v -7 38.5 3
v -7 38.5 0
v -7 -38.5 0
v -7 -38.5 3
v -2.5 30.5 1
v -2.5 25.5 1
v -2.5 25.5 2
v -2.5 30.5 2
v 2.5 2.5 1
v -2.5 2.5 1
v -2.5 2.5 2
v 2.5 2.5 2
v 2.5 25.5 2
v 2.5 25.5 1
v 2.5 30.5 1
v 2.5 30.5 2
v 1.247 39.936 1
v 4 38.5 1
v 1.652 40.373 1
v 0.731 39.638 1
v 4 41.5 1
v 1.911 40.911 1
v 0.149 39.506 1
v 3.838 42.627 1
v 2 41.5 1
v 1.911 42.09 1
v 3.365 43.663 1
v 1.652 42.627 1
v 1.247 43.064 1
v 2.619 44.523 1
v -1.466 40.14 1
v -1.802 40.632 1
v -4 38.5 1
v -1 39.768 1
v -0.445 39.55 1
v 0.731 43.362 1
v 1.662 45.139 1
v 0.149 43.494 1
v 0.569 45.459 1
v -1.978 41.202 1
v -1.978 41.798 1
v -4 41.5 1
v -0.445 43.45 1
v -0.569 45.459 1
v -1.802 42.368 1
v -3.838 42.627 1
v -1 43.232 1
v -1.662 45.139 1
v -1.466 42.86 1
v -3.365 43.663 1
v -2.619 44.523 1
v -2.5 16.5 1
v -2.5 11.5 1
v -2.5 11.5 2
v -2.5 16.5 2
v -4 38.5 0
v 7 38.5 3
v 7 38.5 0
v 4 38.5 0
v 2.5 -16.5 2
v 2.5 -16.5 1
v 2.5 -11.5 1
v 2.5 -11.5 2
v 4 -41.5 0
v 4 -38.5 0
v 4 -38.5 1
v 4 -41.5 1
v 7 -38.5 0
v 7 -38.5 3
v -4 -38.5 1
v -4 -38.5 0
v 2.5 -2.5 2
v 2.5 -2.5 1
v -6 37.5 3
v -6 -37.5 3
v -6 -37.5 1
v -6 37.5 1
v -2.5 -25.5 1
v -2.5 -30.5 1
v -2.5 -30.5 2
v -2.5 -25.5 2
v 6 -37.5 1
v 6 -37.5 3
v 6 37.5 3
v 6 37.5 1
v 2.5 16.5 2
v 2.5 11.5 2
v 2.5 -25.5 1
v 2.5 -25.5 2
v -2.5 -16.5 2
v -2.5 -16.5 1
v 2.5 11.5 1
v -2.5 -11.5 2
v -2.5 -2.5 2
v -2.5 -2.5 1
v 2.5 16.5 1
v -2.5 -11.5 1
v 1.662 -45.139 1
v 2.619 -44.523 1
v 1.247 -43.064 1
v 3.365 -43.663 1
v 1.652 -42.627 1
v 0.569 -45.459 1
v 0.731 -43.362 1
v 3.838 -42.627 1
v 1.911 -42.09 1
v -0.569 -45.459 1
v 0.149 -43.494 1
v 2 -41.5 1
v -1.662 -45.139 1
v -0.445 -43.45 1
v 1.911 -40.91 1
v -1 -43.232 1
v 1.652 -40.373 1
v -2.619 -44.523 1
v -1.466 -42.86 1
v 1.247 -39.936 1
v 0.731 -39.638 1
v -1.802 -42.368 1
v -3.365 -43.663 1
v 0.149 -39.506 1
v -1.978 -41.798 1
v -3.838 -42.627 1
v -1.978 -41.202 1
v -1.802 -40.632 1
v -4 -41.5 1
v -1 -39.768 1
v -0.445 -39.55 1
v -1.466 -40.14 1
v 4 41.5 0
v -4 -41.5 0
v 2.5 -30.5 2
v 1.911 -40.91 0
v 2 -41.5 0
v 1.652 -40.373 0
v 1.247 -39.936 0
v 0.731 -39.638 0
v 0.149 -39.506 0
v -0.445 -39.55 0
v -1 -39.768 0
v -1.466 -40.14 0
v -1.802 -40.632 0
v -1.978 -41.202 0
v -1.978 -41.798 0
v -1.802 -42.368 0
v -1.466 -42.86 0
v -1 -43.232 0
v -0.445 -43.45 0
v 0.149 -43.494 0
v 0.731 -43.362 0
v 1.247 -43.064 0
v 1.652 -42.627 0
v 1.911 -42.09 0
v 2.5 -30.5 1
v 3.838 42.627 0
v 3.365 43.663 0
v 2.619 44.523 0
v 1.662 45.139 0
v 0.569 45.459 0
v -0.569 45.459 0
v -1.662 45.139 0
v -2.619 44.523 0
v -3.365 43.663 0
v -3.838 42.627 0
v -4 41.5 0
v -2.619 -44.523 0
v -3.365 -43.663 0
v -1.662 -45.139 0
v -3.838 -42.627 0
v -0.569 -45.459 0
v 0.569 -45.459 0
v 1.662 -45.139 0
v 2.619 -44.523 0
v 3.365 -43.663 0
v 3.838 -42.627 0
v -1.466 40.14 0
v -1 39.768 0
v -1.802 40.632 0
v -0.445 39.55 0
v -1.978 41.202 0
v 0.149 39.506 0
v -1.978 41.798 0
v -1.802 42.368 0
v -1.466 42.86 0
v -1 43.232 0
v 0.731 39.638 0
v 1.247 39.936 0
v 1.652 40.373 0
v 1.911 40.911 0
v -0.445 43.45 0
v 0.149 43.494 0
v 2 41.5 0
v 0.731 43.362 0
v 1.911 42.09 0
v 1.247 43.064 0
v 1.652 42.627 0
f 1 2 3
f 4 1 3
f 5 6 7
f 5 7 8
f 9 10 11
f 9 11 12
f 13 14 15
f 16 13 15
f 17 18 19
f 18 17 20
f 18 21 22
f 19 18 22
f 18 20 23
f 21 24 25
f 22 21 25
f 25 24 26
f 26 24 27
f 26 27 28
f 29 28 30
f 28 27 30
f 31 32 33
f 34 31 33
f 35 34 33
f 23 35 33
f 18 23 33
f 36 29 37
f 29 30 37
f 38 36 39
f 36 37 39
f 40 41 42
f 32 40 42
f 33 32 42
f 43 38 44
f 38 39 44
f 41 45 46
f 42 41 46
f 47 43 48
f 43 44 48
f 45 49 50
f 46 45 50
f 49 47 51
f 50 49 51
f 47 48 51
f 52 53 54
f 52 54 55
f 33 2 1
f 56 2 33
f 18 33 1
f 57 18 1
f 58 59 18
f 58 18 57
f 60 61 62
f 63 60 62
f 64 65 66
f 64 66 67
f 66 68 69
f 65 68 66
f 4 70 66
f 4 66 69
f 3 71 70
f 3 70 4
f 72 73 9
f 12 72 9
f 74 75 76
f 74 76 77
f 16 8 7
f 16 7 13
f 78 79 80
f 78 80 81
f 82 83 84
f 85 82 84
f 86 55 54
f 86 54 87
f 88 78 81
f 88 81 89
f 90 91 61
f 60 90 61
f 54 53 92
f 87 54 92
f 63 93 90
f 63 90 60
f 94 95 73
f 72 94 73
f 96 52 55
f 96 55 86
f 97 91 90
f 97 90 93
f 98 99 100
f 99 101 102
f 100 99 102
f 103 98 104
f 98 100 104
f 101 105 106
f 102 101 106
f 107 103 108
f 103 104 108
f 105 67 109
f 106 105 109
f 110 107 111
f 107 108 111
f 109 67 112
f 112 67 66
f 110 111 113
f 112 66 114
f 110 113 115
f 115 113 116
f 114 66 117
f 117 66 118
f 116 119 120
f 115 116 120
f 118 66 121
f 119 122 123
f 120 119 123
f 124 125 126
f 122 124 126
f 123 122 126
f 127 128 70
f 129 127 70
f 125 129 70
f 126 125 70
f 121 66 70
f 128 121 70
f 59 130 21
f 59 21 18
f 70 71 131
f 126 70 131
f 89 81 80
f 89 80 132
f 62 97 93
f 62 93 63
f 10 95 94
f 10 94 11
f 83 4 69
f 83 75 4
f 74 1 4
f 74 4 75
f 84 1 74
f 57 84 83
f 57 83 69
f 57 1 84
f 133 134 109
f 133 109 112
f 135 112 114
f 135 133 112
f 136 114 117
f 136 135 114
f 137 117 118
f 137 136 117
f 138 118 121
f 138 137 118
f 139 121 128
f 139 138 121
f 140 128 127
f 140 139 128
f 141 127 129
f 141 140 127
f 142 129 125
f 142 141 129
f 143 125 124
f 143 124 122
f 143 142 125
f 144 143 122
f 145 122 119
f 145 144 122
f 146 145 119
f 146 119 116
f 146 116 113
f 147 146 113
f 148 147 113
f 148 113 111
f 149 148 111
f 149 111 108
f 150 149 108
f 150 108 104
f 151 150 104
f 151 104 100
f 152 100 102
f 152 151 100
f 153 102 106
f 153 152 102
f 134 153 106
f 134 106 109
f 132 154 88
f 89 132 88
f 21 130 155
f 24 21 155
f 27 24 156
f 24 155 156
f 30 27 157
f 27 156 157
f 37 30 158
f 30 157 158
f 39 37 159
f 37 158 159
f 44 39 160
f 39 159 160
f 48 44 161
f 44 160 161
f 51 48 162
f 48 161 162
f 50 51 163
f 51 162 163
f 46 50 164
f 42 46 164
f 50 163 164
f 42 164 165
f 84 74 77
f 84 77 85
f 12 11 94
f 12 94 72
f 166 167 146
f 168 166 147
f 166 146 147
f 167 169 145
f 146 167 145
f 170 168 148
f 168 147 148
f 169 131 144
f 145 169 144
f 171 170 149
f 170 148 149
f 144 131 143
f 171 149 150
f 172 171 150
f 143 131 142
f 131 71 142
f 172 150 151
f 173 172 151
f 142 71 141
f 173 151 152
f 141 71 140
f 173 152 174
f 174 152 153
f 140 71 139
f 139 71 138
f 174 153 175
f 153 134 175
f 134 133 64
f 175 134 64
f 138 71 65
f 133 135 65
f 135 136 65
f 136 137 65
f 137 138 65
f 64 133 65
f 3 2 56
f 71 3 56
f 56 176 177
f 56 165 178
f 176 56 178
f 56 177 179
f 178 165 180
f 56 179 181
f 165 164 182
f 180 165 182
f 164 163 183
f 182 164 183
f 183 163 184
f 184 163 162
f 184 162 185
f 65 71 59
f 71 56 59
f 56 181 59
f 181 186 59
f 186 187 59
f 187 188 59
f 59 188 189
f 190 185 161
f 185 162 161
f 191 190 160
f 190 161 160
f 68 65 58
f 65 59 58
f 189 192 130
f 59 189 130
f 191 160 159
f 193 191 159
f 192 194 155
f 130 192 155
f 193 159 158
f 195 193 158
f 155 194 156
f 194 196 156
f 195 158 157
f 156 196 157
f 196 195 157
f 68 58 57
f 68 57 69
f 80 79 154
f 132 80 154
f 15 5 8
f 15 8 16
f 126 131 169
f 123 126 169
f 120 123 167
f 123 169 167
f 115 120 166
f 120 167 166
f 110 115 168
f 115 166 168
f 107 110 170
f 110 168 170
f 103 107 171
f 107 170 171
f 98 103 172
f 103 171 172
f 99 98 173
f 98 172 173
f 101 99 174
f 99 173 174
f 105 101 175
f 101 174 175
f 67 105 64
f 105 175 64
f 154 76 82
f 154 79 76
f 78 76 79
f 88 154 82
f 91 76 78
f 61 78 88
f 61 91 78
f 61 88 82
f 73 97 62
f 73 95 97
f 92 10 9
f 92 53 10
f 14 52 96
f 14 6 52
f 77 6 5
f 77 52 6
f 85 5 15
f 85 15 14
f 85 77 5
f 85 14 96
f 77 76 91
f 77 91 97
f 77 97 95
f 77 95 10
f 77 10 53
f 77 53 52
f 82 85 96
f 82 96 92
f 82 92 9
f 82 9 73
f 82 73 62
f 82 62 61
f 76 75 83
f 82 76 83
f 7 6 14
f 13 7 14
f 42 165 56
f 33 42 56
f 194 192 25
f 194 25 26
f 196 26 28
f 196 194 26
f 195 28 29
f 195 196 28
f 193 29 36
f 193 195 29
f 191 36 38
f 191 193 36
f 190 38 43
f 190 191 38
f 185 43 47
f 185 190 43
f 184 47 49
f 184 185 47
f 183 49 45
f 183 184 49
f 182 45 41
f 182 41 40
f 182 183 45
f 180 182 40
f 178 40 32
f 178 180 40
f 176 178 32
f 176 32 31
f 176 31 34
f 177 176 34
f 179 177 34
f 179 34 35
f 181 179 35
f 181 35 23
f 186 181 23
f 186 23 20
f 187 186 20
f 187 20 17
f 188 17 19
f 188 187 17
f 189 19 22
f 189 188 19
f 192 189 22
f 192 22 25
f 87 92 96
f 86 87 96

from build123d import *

# Parameters (mm, degrees)
SKETCH_R     = 2
PAD_DEPTH    = 1
SKETCH001_W  = 14
SKETCH001_H  = 77
PAD001_DEPTH = 3
SKETCH002_W  = 12
SKETCH002_H  = 75
POCKET_DEPTH = 2
SKETCH003_W  = 5
SKETCH003_H  = 5
PAD002_DEPTH = 2


with BuildPart() as part:
    # Sketch → Pad (new body)
    with BuildSketch(Plane.XY):
        with BuildLine():
            Line((7, 38.5), (7, -38.5))
            Line((7, -38.5), (4, -38.5))
            Line((4, -38.5), (4, -41.5))
            ThreePointArc((-4, -41.5), (0, -45.5), (4, -41.5))
            Line((-4, -38.5), (-4, -41.5))
            Line((-7, -38.5), (-4, -38.5))
            Line((-7, 38.5), (-7, -38.5))
            Line((-7, 38.5), (-4, 38.5))
            Line((-4, 41.5), (-4, 38.5))
            ThreePointArc((4, 41.5), (0, 45.500017), (-4, 41.5))
            Line((4, 41.5), (4, 38.5))
            Line((4, 38.5), (7, 38.5))
        make_face()
        with Locations((0, -41.5)):
            Circle(SKETCH_R, mode=Mode.SUBTRACT)
        with Locations((0, 41.500017)):
            Circle(SKETCH_R, mode=Mode.SUBTRACT)
    extrude(amount=PAD_DEPTH)

    # Sketch001 → Pad001 (join)
    with BuildSketch(Plane.XY):
        Rectangle(SKETCH001_W, SKETCH001_H)
    extrude(amount=PAD001_DEPTH)

    # Sketch002 (on Face17 of Pad001) → Pocket (cut)
    with BuildSketch(Plane.XY.offset(3)):
        Rectangle(SKETCH002_W, SKETCH002_H)
    extrude(amount=-POCKET_DEPTH, mode=Mode.SUBTRACT)

    # Sketch003 → Pad002 (join)
    with BuildSketch(Plane.XY):
        with Locations((0, 28)):
            Rectangle(SKETCH003_W, SKETCH003_H)
        with Locations((0, 14)):
            Rectangle(SKETCH003_W, SKETCH003_H)
        Rectangle(SKETCH003_W, SKETCH003_H)
        with Locations((0, -14)):
            Rectangle(SKETCH003_W, SKETCH003_H)
        with Locations((0, -28)):
            Rectangle(SKETCH003_W, SKETCH003_H)
    extrude(amount=PAD002_DEPTH)


solid = part.part
